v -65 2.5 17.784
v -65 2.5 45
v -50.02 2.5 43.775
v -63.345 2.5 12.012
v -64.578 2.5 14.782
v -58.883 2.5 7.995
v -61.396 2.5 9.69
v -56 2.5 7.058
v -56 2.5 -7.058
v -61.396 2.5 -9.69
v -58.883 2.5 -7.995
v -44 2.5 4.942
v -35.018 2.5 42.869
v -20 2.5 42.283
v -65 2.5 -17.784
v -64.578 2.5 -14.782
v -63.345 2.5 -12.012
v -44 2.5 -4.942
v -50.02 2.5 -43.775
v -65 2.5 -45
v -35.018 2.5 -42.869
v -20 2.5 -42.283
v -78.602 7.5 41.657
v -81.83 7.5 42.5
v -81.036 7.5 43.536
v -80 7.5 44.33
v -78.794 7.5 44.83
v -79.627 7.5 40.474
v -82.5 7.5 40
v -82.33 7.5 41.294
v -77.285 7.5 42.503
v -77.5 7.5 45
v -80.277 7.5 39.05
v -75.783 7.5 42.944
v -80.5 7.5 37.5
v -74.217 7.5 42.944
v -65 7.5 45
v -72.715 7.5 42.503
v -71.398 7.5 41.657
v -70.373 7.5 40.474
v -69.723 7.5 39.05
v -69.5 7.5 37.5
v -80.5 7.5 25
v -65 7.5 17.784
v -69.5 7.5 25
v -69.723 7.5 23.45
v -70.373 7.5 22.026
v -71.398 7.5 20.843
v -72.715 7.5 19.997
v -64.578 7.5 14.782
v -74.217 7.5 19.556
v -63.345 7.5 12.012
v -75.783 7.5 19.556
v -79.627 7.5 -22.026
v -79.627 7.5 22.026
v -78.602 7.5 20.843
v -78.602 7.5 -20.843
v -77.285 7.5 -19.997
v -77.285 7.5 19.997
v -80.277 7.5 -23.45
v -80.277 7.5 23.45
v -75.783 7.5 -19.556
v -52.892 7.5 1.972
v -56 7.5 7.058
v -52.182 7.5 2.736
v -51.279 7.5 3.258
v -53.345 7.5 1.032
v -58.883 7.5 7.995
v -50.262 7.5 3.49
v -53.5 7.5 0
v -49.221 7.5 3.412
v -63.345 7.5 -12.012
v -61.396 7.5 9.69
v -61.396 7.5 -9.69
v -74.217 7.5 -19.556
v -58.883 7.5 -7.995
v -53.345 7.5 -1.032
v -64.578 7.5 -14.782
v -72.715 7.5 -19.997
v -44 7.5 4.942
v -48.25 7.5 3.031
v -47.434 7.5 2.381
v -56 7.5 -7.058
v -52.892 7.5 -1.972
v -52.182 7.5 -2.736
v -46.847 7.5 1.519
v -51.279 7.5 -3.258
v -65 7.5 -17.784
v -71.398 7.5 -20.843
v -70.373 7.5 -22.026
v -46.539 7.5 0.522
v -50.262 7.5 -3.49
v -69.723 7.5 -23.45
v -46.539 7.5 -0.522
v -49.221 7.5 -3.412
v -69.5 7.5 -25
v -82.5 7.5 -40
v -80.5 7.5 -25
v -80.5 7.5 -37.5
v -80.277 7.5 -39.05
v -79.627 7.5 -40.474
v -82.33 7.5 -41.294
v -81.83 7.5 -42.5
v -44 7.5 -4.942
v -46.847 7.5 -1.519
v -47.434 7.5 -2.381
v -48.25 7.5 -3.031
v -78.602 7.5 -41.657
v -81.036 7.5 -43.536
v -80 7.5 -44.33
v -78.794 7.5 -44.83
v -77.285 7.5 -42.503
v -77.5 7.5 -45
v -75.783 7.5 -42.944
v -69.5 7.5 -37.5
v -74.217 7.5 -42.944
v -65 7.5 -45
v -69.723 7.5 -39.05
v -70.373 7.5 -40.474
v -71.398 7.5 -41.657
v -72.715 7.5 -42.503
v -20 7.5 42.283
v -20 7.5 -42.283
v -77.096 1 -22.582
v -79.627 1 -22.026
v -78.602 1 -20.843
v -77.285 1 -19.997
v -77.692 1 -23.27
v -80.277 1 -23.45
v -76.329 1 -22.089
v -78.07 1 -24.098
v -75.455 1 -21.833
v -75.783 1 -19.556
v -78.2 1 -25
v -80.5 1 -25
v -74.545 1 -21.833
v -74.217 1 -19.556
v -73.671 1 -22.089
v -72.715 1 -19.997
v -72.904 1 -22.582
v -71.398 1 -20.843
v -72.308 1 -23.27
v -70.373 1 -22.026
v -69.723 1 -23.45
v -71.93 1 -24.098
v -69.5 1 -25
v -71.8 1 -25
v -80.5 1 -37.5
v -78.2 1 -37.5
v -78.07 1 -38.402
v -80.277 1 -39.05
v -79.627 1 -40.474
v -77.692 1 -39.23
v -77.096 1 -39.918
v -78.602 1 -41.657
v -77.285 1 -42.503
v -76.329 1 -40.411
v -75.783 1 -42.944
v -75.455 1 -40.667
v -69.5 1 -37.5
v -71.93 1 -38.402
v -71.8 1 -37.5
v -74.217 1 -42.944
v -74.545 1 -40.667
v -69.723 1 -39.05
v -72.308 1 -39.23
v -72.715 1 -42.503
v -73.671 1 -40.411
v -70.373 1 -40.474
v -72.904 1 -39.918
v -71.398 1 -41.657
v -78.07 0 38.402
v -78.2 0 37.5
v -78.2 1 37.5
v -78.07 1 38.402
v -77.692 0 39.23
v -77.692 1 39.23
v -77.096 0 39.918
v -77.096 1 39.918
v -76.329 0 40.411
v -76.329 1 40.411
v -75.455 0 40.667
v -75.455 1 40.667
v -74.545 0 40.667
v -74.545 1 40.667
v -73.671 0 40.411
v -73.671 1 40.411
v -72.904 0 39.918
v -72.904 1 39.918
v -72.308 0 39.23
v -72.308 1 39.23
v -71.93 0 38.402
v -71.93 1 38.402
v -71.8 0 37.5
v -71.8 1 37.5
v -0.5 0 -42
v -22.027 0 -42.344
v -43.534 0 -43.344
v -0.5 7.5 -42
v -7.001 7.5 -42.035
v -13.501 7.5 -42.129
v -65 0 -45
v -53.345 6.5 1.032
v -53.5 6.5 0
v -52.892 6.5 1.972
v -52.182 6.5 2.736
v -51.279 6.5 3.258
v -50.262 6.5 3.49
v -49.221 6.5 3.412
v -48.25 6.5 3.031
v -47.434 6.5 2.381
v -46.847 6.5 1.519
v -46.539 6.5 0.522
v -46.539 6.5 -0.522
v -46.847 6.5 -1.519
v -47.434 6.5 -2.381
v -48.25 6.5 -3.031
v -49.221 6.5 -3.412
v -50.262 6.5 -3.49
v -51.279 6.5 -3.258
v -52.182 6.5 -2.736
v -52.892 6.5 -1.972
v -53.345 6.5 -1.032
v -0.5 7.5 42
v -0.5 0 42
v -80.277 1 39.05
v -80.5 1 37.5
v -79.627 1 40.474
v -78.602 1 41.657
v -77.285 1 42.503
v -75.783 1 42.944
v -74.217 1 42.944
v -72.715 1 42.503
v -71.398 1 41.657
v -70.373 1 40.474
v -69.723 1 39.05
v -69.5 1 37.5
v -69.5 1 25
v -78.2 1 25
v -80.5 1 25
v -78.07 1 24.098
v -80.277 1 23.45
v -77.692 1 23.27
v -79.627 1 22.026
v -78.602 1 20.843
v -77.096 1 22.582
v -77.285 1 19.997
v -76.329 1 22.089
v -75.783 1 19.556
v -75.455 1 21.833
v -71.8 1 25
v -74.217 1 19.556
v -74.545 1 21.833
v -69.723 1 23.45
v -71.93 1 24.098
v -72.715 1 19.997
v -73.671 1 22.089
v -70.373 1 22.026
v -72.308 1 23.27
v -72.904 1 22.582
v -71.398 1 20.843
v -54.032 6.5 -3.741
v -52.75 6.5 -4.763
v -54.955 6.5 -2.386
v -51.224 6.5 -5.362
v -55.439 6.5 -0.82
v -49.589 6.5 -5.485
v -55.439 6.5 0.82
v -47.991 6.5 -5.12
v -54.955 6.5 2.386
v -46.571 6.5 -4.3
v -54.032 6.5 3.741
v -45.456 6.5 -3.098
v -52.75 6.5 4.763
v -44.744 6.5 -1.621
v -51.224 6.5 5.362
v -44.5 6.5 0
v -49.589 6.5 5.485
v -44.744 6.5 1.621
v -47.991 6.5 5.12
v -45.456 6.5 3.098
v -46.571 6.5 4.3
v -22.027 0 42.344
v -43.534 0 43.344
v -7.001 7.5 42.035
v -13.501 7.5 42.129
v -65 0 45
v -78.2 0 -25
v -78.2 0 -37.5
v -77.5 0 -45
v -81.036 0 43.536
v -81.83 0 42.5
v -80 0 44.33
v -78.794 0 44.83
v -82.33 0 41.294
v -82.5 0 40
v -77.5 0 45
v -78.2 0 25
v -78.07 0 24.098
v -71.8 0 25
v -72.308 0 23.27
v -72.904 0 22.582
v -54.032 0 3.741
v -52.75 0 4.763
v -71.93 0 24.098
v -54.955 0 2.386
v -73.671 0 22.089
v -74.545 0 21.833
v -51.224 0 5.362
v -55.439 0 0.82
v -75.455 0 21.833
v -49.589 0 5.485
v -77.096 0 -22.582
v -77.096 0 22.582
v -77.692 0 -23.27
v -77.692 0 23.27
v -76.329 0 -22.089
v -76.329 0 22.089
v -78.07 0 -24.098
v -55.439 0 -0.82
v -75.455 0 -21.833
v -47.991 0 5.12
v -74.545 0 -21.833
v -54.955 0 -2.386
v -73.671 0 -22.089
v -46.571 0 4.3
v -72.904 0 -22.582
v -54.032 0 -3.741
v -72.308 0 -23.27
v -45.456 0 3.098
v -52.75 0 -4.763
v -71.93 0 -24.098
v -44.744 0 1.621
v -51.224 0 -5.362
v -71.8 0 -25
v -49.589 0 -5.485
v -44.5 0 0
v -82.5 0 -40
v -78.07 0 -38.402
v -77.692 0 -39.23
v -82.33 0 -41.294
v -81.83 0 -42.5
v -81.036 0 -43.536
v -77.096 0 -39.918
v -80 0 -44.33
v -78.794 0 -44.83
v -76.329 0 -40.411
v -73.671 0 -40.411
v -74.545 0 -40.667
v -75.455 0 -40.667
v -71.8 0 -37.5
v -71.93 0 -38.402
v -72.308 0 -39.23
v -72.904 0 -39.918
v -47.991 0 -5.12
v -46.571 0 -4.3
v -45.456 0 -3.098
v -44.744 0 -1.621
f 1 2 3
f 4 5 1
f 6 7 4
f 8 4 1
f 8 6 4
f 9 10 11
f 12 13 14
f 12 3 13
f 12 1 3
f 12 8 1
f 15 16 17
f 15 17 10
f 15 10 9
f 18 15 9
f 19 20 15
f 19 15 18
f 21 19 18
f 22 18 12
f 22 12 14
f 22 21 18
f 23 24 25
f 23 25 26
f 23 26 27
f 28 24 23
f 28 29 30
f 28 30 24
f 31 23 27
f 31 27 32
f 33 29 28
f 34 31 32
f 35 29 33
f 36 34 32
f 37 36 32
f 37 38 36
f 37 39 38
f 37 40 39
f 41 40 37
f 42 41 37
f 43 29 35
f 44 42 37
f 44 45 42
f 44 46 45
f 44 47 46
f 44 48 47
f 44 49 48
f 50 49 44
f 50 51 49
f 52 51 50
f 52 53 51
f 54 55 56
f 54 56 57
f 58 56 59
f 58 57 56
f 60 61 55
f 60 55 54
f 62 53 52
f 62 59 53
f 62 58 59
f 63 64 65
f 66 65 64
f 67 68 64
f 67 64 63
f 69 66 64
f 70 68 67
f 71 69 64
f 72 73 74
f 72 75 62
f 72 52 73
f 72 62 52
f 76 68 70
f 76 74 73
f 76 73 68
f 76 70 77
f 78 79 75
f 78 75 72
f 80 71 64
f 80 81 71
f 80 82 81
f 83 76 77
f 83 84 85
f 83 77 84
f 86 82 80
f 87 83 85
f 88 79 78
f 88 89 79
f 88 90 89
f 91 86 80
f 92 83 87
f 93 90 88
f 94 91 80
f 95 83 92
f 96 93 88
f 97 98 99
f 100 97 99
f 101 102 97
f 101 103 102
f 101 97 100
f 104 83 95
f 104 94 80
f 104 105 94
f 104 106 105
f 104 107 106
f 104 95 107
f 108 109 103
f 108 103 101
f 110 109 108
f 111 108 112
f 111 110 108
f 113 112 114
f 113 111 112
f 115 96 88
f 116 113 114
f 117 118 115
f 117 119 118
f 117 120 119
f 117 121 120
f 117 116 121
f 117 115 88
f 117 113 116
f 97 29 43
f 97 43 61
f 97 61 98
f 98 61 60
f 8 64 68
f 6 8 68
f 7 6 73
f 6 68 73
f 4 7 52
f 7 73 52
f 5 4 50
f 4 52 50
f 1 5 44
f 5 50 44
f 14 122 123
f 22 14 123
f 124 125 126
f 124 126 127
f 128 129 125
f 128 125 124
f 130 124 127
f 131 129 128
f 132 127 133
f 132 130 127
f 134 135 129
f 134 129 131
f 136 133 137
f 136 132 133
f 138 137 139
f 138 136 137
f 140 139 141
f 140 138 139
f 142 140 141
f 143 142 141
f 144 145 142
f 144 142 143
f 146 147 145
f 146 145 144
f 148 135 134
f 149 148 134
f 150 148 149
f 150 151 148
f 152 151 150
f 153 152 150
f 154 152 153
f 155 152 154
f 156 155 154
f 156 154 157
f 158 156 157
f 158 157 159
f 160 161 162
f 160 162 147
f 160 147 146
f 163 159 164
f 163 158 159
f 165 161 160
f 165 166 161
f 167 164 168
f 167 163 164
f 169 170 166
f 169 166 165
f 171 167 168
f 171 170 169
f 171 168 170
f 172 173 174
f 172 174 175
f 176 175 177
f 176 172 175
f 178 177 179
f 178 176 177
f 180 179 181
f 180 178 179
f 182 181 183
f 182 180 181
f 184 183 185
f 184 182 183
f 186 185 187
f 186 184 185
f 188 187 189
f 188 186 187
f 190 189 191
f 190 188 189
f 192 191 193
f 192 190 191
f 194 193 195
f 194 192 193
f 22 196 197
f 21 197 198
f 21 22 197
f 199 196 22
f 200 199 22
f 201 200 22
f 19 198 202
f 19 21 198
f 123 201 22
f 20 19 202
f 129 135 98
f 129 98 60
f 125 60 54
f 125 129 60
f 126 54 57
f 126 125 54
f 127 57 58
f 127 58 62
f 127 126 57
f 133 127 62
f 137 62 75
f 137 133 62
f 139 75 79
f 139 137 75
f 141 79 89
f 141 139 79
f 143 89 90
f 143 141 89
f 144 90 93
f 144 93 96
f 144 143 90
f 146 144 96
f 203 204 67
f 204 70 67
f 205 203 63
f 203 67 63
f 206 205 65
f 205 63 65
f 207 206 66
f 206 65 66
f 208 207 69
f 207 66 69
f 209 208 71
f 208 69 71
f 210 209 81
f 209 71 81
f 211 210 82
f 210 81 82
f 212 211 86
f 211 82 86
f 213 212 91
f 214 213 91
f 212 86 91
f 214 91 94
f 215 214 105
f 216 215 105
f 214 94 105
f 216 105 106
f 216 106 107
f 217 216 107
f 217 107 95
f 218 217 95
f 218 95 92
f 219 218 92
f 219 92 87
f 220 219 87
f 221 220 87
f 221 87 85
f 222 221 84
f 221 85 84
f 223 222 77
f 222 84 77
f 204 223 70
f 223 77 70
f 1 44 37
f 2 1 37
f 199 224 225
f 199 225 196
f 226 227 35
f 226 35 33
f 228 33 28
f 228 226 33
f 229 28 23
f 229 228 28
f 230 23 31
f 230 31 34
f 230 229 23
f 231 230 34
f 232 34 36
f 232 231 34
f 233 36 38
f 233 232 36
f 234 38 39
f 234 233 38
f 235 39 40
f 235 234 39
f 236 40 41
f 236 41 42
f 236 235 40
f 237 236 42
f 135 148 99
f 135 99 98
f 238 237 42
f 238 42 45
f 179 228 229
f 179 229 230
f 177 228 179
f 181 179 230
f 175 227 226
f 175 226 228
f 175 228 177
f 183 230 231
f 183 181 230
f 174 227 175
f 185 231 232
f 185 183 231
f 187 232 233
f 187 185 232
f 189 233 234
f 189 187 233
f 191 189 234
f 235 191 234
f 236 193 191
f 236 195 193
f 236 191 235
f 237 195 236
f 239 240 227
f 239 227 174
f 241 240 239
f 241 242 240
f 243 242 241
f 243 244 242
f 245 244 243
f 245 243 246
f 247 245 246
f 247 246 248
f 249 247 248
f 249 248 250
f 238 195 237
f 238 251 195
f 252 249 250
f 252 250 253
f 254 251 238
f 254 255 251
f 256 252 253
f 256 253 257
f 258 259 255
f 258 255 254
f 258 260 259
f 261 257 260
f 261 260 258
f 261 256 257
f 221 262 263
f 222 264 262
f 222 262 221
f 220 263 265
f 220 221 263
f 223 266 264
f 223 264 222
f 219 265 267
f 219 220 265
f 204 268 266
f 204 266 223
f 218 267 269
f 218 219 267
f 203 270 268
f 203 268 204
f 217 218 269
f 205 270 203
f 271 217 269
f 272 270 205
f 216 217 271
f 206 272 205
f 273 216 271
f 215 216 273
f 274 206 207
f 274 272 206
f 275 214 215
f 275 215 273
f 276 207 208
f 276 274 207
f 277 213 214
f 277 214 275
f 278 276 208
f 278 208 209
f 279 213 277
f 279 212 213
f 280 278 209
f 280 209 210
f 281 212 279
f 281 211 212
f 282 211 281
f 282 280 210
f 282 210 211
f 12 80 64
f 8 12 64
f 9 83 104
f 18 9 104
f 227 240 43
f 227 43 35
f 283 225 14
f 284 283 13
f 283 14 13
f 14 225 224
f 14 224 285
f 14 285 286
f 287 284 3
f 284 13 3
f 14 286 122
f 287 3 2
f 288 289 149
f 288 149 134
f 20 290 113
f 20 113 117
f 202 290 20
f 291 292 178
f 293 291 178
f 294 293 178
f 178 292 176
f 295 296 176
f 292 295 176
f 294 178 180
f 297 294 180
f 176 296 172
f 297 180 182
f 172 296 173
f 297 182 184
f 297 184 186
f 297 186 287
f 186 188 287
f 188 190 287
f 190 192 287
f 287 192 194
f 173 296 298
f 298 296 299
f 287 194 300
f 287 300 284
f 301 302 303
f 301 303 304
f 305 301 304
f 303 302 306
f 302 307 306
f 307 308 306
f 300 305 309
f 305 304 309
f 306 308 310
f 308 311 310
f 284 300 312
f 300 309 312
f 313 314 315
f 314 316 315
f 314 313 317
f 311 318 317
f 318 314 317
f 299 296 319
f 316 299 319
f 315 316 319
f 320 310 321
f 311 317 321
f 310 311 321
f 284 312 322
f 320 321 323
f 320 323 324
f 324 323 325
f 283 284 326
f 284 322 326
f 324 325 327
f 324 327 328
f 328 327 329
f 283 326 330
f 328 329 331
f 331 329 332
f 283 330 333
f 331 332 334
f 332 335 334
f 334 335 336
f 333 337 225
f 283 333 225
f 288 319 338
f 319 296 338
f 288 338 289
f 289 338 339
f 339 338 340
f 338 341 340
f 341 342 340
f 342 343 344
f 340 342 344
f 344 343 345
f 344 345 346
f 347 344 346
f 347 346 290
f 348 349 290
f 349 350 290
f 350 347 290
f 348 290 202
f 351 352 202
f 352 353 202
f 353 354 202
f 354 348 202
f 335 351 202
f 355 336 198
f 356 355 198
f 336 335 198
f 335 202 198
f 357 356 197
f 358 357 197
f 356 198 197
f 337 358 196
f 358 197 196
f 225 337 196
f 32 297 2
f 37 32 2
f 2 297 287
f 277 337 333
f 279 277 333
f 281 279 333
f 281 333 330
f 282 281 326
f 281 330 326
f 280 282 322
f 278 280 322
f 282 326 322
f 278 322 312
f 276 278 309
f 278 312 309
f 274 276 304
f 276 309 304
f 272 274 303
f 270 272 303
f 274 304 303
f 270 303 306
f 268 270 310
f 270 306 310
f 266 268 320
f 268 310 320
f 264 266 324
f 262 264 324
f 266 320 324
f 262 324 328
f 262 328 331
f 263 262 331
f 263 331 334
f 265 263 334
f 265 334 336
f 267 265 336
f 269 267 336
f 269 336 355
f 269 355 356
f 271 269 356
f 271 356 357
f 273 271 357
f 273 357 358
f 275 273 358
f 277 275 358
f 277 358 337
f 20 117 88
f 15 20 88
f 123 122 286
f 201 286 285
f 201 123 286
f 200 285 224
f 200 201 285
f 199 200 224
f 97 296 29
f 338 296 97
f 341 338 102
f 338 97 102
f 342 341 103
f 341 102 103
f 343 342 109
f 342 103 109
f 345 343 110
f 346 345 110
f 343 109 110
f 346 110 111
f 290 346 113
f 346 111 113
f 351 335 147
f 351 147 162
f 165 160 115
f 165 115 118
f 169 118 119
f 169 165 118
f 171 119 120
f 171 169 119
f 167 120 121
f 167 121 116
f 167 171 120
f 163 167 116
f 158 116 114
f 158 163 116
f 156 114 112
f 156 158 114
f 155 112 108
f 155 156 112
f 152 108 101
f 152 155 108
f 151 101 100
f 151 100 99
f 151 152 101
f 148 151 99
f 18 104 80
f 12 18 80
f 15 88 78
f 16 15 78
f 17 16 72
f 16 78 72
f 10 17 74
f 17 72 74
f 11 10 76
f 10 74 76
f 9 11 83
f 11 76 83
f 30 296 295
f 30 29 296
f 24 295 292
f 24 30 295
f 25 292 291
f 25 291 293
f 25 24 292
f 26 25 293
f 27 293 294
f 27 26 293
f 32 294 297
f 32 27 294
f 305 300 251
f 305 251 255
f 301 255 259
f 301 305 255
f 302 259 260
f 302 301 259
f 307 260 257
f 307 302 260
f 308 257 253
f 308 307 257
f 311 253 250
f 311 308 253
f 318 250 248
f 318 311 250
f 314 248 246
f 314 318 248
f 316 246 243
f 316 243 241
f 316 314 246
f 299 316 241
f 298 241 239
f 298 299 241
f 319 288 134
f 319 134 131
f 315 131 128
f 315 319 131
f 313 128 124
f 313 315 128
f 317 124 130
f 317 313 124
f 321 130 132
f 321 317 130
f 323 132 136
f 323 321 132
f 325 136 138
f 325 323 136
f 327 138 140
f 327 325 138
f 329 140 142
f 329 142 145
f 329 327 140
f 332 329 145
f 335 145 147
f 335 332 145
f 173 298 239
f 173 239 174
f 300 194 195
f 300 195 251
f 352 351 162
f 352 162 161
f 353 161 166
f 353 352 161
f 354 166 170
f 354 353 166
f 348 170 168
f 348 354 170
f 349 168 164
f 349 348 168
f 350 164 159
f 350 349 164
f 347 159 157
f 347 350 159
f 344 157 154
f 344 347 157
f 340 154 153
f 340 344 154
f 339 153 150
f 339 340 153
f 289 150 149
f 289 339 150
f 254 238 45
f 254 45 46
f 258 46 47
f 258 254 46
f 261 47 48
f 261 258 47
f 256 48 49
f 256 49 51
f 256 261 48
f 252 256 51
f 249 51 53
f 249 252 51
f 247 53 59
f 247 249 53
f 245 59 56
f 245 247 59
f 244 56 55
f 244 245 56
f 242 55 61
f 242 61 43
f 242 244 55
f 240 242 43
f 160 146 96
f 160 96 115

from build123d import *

# Parameters (mm, degrees)
SKETCH1_W                                           = 165
SKETCH1_H                                           = 90
BOSS_EXTRUDE1_DEPTH                                 = 7.5
CUT_EXTRUDE2_REACH                                  = 96.274
CBORE_START                                         = 1
CBORE_SLOT_FOR_M6_HEX_SOCKET_HEAD_CAP_SC_DEPTH      = 6.5
CBORE_SLOT_FOR_M6_HEX_SOCKET_HEAD_CA_3_DEPTH        = 1
FILLET1_R                                           = 5
CBORE_FOR_M6_HEX_SOCKET_HEAD_CAP_SCREW1_D           = 7
CBORE_FOR_M6_HEX_SOCKET_HEAD_CAP_SCREW1_CBORE_D     = 11
CBORE_FOR_M6_HEX_SOCKET_HEAD_CAP_SCREW1_CBORE_DEPTH = 6.5
CUT_EXTRUDE3_DEPTH                                  = 5
CUT_EXTRUDE4_REACH                                  = 96.274
SKETCH13_W                                          = 82.5
SKETCH13_H                                          = 90
CUT_EXTRUDE5_REACH                                  = 96.274
SKETCH14_W                                          = 0.5
SKETCH14_H                                          = 84.000354274


# Read off the part's stored shape, not the designer's step: CBORE SLOT for M6 Hex Socket Head Cap Screw1
with BuildPart() as part:
    # Sketch1 → Boss-Extrude1 (new body)
    with BuildSketch(Plane(origin=(0, 0, 0), x_dir=(1, 0, 0), z_dir=(0, 1, 0))):
        Rectangle(SKETCH1_W, SKETCH1_H)
    extrude(amount=BOSS_EXTRUDE1_DEPTH)

    # Sketch7 → Cut-Extrude2 (cut, up to next)
    with BuildSketch(Plane(origin=(0, 7.5, 0), x_dir=(1, 0, 0), z_dir=(0, 1, 0)), mode=Mode.PRIVATE) as cut_extrude2_sk1:
        with BuildLine():
            Line((-65, 45), (65, 45))
            ThreePointArc((65, 45), (0, 42), (-65, 45))
        make_face()
    cut_extrude2_tool1 = extrude(cut_extrude2_sk1.sketch, amount=-CUT_EXTRUDE2_REACH, mode=Mode.PRIVATE) & part.part
    # Sketch7 → Cut-Extrude2 (cut, up to next)
    with BuildSketch(Plane(origin=(0, 7.5, 0), x_dir=(1, 0, 0), z_dir=(0, 1, 0)), mode=Mode.PRIVATE) as cut_extrude2_sk2:
        with BuildLine():
            Line((-65, -45), (65, -45))
            ThreePointArc((65, -45), (0, -42), (-65, -45))
        make_face()
    cut_extrude2_tool2 = extrude(cut_extrude2_sk2.sketch, amount=-CUT_EXTRUDE2_REACH, mode=Mode.PRIVATE) & part.part
    add(cut_extrude2_tool1.solids().sort_by_distance((0, 7.5, -43.799781))[0], mode=Mode.SUBTRACT)
    add(cut_extrude2_tool2.solids().sort_by_distance((0, 7.5, 43.799781))[0], mode=Mode.SUBTRACT)

    # CBORE SLOT for M6 Hex Socket Head Ca 2 → CBORE SLOT for M6 Hex Socket Head Cap Screw1 (cut)
    with BuildSketch(Plane(origin=(0, 0, 0), x_dir=(1, 0, 0), z_dir=(0, 1, 0)).offset(CBORE_START)):
        with BuildLine():
            Line((80.5, -37.5), (80.5, -25))
            ThreePointArc((80.5, -25), (75, -19.5), (69.5, -25))
            Line((69.5, -25), (69.5, -37.5))
            ThreePointArc((69.5, -37.5), (75, -43), (80.5, -37.5))
        make_face()
        with BuildLine():
            ThreePointArc((80.5, 37.5), (75, 43), (69.5, 37.5))
            Line((69.5, 37.5), (69.5, 25))
            ThreePointArc((69.5, 25), (75, 19.5), (80.5, 25))
            Line((80.5, 25), (80.5, 37.5))
        make_face()
        with BuildLine():
            Line((-69.5, -37.5), (-69.5, -25))
            ThreePointArc((-69.5, -25), (-75, -19.5), (-80.5, -25))
            Line((-80.5, -25), (-80.5, -37.5))
            ThreePointArc((-80.5, -37.5), (-75, -43), (-69.5, -37.5))
        make_face()
        with BuildLine():
            ThreePointArc((-69.5, 37.5), (-75, 43), (-80.5, 37.5))
            Line((-80.5, 37.5), (-80.5, 25))
            ThreePointArc((-80.5, 25), (-75, 19.5), (-69.5, 25))
            Line((-69.5, 25), (-69.5, 37.5))
        make_face()
    extrude(amount=CBORE_SLOT_FOR_M6_HEX_SOCKET_HEAD_CAP_SC_DEPTH, mode=Mode.SUBTRACT)

    # CBORE SLOT for M6 Hex Socket Head Ca 3 o → CBORE SLOT for M6 Hex Socket Head Ca 3 (cut)
    with BuildSketch(Plane(origin=(0, 0, 0), x_dir=(1, 0, 0), z_dir=(0, 1, 0))):
        with BuildLine():
            Line((78.2, -37.5), (78.2, -25))
            ThreePointArc((78.2, -25), (75, -21.8), (71.8, -25))
            Line((71.8, -25), (71.8, -37.5))
            ThreePointArc((71.8, -37.5), (75, -40.7), (78.2, -37.5))
        make_face()
        with BuildLine():
            ThreePointArc((78.2, 37.5), (75, 40.7), (71.8, 37.5))
            Line((71.8, 37.5), (71.8, 25))
            ThreePointArc((71.8, 25), (75, 21.8), (78.2, 25))
            Line((78.2, 25), (78.2, 37.5))
        make_face()
        with BuildLine():
            Line((-71.8, -37.5), (-71.8, -25))
            ThreePointArc((-71.8, -25), (-75, -21.8), (-78.2, -25))
            Line((-78.2, -25), (-78.2, -37.5))
            ThreePointArc((-78.2, -37.5), (-75, -40.7), (-71.8, -37.5))
        make_face()
        with BuildLine():
            ThreePointArc((-71.8, 37.5), (-75, 40.7), (-78.2, 37.5))
            Line((-78.2, 37.5), (-78.2, 25))
            ThreePointArc((-78.2, 25), (-75, 21.8), (-71.8, 25))
            Line((-71.8, 25), (-71.8, 37.5))
        make_face()
    extrude(amount=CBORE_SLOT_FOR_M6_HEX_SOCKET_HEAD_CA_3_DEPTH, mode=Mode.SUBTRACT)

    # Fillet1
    fillet1_edges = [part.edges().sort_by_distance(p)[0] for p in [
        (82.5, 3.75, 45),
        (-82.5, 3.75, 45),
        (-82.5, 3.75, -45),
        (82.5, 3.75, -45),
    ]]
    fillet(fillet1_edges, radius=FILLET1_R)

    # CBORE for M6 Hex Socket Head Cap Screw1 (through all)
    with Locations(Plane.XZ):
        with Locations((-50, 0), (50, 0)):
            CounterBoreHole(CBORE_FOR_M6_HEX_SOCKET_HEAD_CAP_SCREW1_D / 2, CBORE_FOR_M6_HEX_SOCKET_HEAD_CAP_SCREW1_CBORE_D / 2, CBORE_FOR_M6_HEX_SOCKET_HEAD_CAP_SCREW1_CBORE_DEPTH)

    # Sketch12 → Cut-Extrude3 (cut)
    with BuildSketch(Plane(origin=(0, 7.5, 0), x_dir=(1, 0, 0), z_dir=(0, 1, 0))):
        with BuildLine():
            Line((-65, 45), (-65, 17.783744218))
            ThreePointArc((-65, 17.783744218), (-62.451932754, 10.782986997), (-56, 7.057961884))
            Line((-56, 7.057961884), (-44, 4.942038116))
            Line((-44, 4.942038116), (-44, -4.942038116))
            Line((-44, -4.942038116), (-56, -7.057961884))
            ThreePointArc((-56, -7.057961884), (-62.451932754, -10.782986997), (-65, -17.783744218))
            Line((-65, -17.783744218), (-65, -45))
            Line((-65, -45), (-20, -45))
            Line((-20, -45), (-20, 45))
            Line((-20, 45), (-65, 45))
        make_face()
        with BuildLine():
            Line((44, 4.942038116), (44, -4.942038116))
            Line((44, -4.942038116), (56, -7.057961884))
            ThreePointArc((56, -7.057961884), (62.451932754, -10.782986997), (65, -17.783744218))
            Line((65, -17.783744218), (65, -45))
            Line((65, -45), (20, -45))
            Line((20, -45), (20, 45))
            Line((20, 45), (65, 45))
            Line((65, 45), (65, 17.783744218))
            ThreePointArc((65, 17.783744218), (62.451932754, 10.782986997), (56, 7.057961884))
            Line((56, 7.057961884), (44, 4.942038116))
        make_face()
    extrude(amount=-CUT_EXTRUDE3_DEPTH, mode=Mode.SUBTRACT)

    # Sketch13 → Cut-Extrude4 (cut, up to next)
    with BuildSketch(Plane(origin=(0, 7.5, 0), x_dir=(1, 0, 0), z_dir=(0, 1, 0)), mode=Mode.PRIVATE) as cut_extrude4_sk1:
        with Locations((41.25, 0)):
            Rectangle(SKETCH13_W, SKETCH13_H)
    cut_extrude4_tool1 = extrude(cut_extrude4_sk1.sketch, amount=-CUT_EXTRUDE4_REACH, mode=Mode.PRIVATE) & part.part
    add(cut_extrude4_tool1.solids().sort_by_distance((41.25, 7.5, 0))[0], mode=Mode.SUBTRACT)

    # Sketch14 → Cut-Extrude5 (cut, up to next)
    with BuildSketch(Plane(origin=(0, 7.5, 0), x_dir=(1, 0, 0), z_dir=(0, 1, 0)), mode=Mode.PRIVATE) as cut_extrude5_sk1:
        with Locations((-0.25, 0)):
            Rectangle(SKETCH14_W, SKETCH14_H)
    cut_extrude5_tool1 = extrude(cut_extrude5_sk1.sketch, amount=-CUT_EXTRUDE5_REACH, mode=Mode.PRIVATE) & part.part
    add(cut_extrude5_tool1.solids().sort_by_distance((-0.25, 7.5, 0))[0], mode=Mode.SUBTRACT)


solid = part.part
